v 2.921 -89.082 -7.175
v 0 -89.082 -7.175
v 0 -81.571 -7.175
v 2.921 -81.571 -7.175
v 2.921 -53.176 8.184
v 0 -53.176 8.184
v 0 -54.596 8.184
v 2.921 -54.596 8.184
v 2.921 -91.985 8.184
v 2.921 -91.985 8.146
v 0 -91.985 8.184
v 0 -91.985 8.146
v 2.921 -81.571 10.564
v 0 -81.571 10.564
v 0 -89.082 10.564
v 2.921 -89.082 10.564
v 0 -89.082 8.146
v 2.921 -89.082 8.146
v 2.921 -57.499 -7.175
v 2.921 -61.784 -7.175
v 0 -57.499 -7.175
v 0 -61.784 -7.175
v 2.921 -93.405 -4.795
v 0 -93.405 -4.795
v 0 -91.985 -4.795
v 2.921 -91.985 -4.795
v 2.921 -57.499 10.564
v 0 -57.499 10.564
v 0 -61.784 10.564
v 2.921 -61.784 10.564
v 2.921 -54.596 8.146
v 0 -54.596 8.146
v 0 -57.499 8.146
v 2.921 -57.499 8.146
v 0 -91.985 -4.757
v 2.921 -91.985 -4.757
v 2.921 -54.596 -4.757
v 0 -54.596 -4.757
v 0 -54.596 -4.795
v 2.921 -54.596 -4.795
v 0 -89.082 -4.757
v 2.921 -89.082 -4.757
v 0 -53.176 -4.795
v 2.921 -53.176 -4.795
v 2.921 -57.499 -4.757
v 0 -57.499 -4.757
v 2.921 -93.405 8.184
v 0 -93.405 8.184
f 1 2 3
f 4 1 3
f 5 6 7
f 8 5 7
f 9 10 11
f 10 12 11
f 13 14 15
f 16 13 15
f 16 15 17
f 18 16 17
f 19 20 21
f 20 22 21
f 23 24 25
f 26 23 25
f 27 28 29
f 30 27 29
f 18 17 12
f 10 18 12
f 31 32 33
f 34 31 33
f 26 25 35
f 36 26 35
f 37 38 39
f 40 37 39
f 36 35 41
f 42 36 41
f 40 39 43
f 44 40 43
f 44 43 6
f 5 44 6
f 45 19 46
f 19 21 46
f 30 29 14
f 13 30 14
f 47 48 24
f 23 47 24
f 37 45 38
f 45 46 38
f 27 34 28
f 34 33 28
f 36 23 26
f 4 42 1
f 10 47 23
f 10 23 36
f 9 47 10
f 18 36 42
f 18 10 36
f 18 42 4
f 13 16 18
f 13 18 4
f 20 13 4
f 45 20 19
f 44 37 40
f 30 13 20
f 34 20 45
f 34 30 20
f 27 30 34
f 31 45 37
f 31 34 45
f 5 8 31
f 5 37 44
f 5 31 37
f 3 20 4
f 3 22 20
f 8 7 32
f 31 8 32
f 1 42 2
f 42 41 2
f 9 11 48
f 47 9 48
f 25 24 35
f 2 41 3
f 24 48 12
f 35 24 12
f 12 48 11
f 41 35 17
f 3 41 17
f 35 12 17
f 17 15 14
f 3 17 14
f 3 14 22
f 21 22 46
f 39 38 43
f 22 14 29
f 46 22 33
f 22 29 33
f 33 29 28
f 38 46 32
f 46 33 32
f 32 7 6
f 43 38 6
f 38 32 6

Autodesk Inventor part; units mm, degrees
ref_plane "YZ Plane" through (0, 0, 0) normal (1, 0, 0) x (0, 1, 0)
ref_plane "XZ Plane" through (0, 0, 0) normal (0, 1, 0) x (-1, 0, 0)
ref_plane "XY Plane" through (0, 0, 0) normal (0, 0, 1) x (1, 0, 0)
sketch "Sketch1" plane through (0, 0, 0) normal (1, 0, 0) x (0, 1, 0)
  line L0 (-91.985, -4.7571) -> (-89.0815, -4.7571)
  line L1 (-89.0815, -4.7571) -> (-89.0815, -7.1749)
  line L2 (-89.0815, -7.1749) -> (-81.5711, -7.1749)
  line L3 (-57.4992, -7.1749) -> (-57.4992, -4.7571)
  line L4 (-57.4992, -4.7571) -> (-54.5957, -4.7571)
  line L5 (-54.5957, -4.7571) -> (-54.5957, -4.795)
  line L6 (-54.5957, -4.795) -> (-53.1756, -4.795)
  line L7 (-53.1756, -4.795) -> (-53.1756, 8.1844)
  line L8 (-53.1756, 8.1844) -> (-54.5957, 8.1844)
  line L9 (-54.5957, 8.1844) -> (-54.5957, 8.1465)
  line L10 (-54.5957, 8.1465) -> (-57.4992, 8.1465)
  line L11 (-57.4992, 8.1465) -> (-57.4992, 10.5643)
  line L12 (-57.4992, 10.5643) -> (-61.7845, 10.5643)
  line L13 (-89.0815, 10.5643) -> (-89.0815, 8.1465)
  line L14 (-89.0815, 8.1465) -> (-91.985, 8.1465)
  line L15 (-91.985, 8.1465) -> (-91.985, 8.1844)
  line L16 (-91.985, 8.1844) -> (-93.4052, 8.1844)
  line L17 (-93.4052, 8.1844) -> (-93.4052, -4.795)
  line L18 (-93.4052, -4.795) -> (-91.985, -4.795)
  line L19 (-91.985, -4.795) -> (-91.985, -4.7571)
  line L20 (-81.5711, 10.5643) -> (-89.0815, 10.5643)
  line L21 (-61.7845, -7.1749) -> (-57.4992, -7.1749)
  line L22 (-61.7845, 10.5643) -> (-81.5711, 10.5643)
  line L23 (-61.7845, -7.1749) -> (-81.5711, -7.1749)
  point P0 (0, 0)
extrude "Extrusion1" add sketch "Sketch1" along normal blind 2.921
